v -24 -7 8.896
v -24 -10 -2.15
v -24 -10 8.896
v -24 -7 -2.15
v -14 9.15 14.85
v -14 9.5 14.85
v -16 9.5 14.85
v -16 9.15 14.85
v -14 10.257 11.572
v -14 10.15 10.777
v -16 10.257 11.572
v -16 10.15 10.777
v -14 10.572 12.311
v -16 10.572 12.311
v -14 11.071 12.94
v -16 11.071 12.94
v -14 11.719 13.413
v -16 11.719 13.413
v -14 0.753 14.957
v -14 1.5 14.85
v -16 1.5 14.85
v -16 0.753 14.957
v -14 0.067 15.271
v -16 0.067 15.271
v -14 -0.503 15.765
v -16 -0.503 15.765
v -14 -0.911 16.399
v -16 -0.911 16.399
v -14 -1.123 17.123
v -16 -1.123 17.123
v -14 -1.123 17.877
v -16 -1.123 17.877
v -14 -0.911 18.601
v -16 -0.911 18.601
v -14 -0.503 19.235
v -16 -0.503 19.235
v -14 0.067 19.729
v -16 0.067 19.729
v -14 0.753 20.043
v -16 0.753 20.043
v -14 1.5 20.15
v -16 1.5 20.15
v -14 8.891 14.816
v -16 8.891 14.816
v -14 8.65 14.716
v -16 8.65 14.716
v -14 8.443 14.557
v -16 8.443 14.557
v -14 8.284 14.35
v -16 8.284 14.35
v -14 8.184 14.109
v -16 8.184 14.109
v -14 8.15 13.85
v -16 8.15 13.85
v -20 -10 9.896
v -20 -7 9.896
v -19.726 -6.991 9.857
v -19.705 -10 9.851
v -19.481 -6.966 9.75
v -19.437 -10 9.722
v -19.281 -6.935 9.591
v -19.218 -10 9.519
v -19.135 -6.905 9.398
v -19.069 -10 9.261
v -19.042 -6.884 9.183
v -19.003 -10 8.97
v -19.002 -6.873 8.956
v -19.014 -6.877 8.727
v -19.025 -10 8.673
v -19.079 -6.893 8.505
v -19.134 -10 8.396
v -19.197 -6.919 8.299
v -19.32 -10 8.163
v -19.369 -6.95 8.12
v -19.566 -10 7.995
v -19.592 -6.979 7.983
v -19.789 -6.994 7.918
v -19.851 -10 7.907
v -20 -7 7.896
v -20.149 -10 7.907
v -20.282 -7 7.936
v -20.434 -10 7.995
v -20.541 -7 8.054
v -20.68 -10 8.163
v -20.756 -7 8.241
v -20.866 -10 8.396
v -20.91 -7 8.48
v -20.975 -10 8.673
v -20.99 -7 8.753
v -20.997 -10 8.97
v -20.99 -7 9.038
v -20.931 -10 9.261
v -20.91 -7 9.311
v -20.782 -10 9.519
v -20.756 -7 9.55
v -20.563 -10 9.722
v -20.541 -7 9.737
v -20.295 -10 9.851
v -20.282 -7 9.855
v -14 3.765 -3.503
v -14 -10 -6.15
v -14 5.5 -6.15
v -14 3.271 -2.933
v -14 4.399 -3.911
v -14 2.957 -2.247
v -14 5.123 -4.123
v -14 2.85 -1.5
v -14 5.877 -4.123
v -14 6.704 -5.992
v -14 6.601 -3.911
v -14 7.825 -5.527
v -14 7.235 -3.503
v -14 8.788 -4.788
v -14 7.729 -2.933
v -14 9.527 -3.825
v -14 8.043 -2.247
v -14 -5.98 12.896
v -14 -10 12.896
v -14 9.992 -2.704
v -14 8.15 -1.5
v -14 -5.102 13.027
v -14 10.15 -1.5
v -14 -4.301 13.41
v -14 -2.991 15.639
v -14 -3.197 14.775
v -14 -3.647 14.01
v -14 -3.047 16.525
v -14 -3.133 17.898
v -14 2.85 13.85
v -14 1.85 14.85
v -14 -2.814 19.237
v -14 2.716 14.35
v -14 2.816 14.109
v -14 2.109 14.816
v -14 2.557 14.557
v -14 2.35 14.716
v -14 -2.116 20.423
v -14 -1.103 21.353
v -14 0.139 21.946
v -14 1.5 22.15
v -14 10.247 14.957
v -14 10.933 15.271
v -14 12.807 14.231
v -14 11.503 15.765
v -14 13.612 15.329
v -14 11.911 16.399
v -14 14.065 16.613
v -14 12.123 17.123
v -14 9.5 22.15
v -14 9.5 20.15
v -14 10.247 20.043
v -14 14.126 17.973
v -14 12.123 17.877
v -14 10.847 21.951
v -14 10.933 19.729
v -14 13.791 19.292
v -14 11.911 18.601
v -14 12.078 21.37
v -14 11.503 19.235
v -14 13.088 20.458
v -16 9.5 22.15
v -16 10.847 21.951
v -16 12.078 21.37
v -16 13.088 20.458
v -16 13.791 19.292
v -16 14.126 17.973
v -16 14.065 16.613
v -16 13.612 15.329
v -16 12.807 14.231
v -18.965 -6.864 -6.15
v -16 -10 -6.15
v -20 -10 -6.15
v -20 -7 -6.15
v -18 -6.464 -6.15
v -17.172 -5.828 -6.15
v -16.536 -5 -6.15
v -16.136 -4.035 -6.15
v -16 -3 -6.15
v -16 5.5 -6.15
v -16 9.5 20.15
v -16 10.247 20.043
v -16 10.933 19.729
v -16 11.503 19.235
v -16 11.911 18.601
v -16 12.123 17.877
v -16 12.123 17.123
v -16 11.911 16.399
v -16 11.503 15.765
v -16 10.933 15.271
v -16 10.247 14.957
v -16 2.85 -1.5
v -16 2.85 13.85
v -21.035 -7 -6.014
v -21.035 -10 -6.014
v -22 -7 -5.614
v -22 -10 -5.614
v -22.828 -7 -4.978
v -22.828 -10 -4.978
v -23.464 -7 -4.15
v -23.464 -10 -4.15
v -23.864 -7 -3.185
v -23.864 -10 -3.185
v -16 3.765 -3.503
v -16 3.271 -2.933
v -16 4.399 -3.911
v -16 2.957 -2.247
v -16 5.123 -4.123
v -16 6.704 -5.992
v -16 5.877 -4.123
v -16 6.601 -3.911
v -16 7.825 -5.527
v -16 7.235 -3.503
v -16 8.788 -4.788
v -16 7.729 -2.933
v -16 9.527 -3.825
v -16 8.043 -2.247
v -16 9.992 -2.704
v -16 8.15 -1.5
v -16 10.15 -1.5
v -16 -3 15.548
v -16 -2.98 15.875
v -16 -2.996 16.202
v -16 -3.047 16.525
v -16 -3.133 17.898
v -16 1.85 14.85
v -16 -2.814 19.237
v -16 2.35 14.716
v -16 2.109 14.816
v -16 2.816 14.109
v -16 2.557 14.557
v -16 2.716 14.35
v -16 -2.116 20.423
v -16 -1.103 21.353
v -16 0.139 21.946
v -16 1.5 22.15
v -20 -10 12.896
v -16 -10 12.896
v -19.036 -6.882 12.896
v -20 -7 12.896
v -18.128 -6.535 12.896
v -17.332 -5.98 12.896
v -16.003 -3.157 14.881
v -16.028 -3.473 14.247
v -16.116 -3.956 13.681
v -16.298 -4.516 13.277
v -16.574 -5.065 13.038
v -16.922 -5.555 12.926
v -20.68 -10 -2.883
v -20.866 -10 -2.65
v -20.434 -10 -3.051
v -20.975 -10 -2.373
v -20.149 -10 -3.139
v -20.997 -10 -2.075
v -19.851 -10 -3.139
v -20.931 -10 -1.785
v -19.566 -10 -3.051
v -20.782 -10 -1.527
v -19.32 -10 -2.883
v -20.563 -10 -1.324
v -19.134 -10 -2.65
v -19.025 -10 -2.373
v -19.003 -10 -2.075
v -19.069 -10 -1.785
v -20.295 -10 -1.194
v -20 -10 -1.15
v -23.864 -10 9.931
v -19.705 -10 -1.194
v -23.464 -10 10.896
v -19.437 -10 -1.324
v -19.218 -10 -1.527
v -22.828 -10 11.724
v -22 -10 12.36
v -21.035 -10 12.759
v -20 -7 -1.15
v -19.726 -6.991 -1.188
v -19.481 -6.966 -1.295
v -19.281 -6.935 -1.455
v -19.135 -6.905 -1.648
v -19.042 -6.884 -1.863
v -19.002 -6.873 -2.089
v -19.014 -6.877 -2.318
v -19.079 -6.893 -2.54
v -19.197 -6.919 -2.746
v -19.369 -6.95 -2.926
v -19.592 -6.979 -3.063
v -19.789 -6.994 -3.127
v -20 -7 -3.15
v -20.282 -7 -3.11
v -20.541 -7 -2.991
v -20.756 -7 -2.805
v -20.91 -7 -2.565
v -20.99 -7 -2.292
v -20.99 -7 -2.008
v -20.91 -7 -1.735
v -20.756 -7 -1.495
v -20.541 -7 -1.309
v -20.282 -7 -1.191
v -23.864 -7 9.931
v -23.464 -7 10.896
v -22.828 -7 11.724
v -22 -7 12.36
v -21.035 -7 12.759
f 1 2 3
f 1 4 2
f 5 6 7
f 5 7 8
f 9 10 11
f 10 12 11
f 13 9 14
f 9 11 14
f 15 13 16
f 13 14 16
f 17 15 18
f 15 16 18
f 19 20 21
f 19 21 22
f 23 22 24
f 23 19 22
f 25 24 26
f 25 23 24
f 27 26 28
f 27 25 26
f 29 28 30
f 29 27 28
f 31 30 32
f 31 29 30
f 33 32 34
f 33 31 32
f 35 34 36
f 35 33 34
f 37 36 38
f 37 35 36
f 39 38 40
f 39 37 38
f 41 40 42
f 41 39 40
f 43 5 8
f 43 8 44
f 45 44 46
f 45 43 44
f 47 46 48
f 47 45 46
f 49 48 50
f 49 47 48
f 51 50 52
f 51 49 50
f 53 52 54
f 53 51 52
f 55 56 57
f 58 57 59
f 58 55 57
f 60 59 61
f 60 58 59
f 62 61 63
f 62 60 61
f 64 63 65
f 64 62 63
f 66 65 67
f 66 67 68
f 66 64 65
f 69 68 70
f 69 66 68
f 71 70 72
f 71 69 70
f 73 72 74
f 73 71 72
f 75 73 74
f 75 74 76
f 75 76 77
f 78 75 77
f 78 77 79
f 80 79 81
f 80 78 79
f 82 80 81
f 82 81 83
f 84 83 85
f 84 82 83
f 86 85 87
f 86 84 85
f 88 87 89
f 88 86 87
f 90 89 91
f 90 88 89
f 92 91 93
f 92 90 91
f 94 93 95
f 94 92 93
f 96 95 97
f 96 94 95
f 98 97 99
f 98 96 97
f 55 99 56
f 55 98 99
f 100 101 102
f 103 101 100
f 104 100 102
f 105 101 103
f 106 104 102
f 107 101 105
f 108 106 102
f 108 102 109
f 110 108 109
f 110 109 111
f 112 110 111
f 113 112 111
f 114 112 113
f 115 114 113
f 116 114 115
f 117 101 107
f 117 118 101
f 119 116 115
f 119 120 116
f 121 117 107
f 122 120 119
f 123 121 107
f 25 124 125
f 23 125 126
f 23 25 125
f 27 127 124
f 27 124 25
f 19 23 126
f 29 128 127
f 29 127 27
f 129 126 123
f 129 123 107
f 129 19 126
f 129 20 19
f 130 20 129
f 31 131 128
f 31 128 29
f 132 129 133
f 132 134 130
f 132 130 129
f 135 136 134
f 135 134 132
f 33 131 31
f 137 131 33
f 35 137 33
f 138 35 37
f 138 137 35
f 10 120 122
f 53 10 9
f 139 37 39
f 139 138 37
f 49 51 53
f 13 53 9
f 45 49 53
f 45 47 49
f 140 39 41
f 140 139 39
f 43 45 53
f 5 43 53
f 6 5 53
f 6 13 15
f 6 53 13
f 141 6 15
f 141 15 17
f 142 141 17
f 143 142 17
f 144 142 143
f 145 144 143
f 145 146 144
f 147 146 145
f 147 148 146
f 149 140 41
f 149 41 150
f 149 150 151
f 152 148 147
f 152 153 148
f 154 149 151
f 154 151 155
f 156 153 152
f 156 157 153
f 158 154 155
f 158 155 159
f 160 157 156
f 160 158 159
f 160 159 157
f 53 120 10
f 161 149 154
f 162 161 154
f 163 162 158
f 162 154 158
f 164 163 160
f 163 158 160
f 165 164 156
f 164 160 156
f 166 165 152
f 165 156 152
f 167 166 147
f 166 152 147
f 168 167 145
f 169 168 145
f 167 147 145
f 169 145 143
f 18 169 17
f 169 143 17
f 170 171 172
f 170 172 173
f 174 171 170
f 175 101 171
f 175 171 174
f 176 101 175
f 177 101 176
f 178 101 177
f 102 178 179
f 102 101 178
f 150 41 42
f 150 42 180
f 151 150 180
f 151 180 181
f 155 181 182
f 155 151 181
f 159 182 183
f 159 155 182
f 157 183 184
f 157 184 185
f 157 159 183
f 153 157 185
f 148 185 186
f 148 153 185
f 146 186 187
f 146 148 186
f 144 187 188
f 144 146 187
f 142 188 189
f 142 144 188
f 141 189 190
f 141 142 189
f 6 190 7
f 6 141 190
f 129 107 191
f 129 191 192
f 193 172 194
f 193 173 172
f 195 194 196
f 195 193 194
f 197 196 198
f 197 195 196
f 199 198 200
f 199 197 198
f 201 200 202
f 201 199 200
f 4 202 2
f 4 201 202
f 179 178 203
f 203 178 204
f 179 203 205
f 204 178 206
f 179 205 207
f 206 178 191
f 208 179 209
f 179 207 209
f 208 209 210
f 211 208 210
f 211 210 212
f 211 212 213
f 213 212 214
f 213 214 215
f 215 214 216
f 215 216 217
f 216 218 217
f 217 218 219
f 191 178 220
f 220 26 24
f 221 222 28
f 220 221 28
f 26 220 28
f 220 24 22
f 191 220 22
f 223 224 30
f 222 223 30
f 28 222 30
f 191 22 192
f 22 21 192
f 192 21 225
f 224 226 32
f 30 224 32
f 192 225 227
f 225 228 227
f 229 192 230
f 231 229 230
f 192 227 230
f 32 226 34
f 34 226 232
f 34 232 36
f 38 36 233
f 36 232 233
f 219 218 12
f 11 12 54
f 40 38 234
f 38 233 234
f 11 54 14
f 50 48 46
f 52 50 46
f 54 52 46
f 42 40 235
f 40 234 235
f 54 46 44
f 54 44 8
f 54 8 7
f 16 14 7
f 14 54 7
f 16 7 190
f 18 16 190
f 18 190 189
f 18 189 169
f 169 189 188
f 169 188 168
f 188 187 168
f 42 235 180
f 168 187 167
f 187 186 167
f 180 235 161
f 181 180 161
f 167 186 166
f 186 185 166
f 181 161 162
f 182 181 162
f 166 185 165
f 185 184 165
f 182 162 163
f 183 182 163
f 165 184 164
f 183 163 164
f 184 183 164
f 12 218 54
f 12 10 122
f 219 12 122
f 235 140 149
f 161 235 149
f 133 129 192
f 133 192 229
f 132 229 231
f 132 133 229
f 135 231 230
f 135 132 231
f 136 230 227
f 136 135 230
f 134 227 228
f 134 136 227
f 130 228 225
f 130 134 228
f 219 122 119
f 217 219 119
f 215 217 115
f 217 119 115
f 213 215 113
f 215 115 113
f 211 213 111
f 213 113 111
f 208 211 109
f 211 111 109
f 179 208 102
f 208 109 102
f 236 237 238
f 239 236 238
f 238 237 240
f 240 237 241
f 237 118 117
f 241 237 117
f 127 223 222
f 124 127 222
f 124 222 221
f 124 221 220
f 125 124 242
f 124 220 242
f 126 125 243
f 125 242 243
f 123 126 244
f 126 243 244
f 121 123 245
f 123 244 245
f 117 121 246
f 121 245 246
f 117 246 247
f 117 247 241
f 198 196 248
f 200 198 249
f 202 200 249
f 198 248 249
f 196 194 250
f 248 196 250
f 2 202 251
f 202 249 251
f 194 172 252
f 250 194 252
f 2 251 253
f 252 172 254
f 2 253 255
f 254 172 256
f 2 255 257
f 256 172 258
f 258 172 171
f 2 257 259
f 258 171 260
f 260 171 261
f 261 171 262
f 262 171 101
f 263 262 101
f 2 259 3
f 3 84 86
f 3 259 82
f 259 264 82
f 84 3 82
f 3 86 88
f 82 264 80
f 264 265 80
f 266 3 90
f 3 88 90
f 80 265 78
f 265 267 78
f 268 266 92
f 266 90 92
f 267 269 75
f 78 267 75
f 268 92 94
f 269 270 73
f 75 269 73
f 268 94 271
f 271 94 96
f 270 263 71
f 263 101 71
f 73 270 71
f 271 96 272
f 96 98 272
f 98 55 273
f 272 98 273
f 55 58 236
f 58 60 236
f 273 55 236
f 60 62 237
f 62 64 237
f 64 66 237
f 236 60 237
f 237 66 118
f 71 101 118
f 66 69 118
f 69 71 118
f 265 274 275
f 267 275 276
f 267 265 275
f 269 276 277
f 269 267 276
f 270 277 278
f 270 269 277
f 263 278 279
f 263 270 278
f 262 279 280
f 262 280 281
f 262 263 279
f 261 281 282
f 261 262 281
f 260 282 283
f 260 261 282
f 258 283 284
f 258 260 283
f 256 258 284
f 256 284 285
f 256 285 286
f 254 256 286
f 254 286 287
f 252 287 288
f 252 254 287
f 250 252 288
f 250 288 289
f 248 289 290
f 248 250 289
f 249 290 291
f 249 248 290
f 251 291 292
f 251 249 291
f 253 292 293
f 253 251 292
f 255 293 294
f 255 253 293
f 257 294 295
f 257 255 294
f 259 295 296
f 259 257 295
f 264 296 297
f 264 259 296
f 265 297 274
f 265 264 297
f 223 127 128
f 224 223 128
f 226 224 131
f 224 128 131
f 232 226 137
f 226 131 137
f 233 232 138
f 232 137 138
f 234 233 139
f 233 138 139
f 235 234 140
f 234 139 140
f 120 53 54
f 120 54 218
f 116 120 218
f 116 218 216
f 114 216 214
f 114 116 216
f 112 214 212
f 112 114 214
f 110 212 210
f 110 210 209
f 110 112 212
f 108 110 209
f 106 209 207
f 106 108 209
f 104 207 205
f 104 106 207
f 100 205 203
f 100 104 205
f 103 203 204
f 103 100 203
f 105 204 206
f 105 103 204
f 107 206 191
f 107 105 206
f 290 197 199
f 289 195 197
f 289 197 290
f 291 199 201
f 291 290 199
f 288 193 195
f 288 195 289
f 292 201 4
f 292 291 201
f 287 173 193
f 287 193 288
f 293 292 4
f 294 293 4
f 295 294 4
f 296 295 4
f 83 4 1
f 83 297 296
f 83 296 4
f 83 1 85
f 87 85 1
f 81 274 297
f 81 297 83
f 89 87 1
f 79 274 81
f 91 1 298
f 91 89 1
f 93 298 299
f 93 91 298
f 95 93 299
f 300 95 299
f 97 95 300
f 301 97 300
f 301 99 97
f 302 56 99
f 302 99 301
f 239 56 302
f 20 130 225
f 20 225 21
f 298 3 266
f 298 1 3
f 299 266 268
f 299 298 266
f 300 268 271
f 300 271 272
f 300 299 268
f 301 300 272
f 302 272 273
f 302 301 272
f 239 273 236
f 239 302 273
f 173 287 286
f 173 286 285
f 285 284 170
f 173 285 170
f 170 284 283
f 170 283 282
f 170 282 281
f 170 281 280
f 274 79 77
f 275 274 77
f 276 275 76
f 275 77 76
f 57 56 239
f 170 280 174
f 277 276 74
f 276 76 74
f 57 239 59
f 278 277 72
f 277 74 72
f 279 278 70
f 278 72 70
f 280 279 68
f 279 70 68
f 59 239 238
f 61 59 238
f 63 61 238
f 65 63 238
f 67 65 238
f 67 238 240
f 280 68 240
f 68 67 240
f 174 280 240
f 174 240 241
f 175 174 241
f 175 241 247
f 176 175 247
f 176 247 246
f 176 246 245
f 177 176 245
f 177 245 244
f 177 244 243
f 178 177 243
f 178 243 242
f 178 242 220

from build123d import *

# Parameters (mm, degrees)
BOSS_EXTRUDE1_DEPTH = 2
BOSS_EXTRUDE2_START = -16
BOSS_EXTRUDE2_DEPTH = 2
SKETCH3_W           = 19.045654227
SKETCH3_H           = 3
BOSS_EXTRUDE3_DEPTH = 8
FILLET1_R           = 4
SKETCH5_W           = 1
SKETCH5_H           = 3
HOLE1_AT_2_COUNT    = 2
HOLE1_AT_2_PITCH    = 11.045654227
CUT_EXTRUDE1_START  = 2
SKETCH6_R           = 1
CUT_EXTRUDE1_DEPTH  = 2
FILLET2_R           = 3
FILLET3_R           = 3


# Read off the part's stored shape, not the designer's step: Boss-Extrude2
with BuildPart() as part:
    # Sketch1 → Boss-Extrude1 (new body)
    with BuildSketch(Plane.ZY.offset(14)):
        with BuildLine():
            Line((12.895654227, 10.15), (-1.5, 10.15))
            ThreePointArc((-1.5, 10.15), (-6.15, 5.5), (-1.5, 0.85))
            Line((-1.5, 0.85), (12.895654227, 0.85))
            ThreePointArc((12.895654227, 0.85), (17.825800671, -3.138572401), (22.15, 1.5))
            Line((22.15, 1.5), (22.15, 9.5))
            ThreePointArc((22.15, 9.5), (17.825800671, 14.138572401), (12.895654227, 10.15))
        make_face()
        with BuildLine():
            Line((13.85, 8.15), (-1.5, 8.15))
            ThreePointArc((-1.5, 8.15), (-4.15, 5.5), (-1.5, 2.85))
            Line((-1.5, 2.85), (13.85, 2.85))
            ThreePointArc((13.85, 2.85), (14.557106781, 2.557106781), (14.85, 1.85))
            Line((14.85, 1.85), (14.85, 1.5))
            ThreePointArc((14.85, 1.5), (17.5, -1.15), (20.15, 1.5))
            Line((20.15, 1.5), (20.15, 9.5))
            ThreePointArc((20.15, 9.5), (17.5, 12.15), (14.85, 9.5))
            Line((14.85, 9.5), (14.85, 9.15))
            ThreePointArc((14.85, 9.15), (14.557106781, 8.442893219), (13.85, 8.15))
        make_face(mode=Mode.SUBTRACT)
    extrude(amount=BOSS_EXTRUDE1_DEPTH)

    # Boss-Extrude2 outline → Boss-Extrude2 (add)
    with BuildSketch(Plane.YZ.offset(BOSS_EXTRUDE2_START)):
        with BuildLine():
            Line((-10, 12.895654227), (-10, -6.15))
            Line((-10, -6.15), (5.5, -6.15))
            ThreePointArc((5.5, -6.15), (2.211953467, -4.788046533), (0.85, -1.5))
            Line((0.85, -1.5), (0.85, 12.895654227))
            Line((0.85, 12.895654227), (-10, 12.895654227))
        make_face()
    extrude(amount=BOSS_EXTRUDE2_DEPTH)

    # Sketch3 → Boss-Extrude3 (add)
    with BuildSketch(Plane.ZY.offset(16)):
        with Locations((3.372827114, -8.5)):
            Rectangle(SKETCH3_W, SKETCH3_H)
    extrude(amount=BOSS_EXTRUDE3_DEPTH)

    # Fillet1
    fillet1_edges = [part.edges().sort_by_distance(p)[0] for p in [
        (-24, -8.5, 12.895654227),
        (-24, -8.5, -6.15),
        (-16, -7, 3.372827113),
    ]]
    fillet(fillet1_edges, radius=FILLET1_R - 0.0001)  # a hair under: the kernel refuses the full size

    # Sketch5 → Hole1 (revolve, cut)
    with BuildSketch(Plane(origin=(-20, -7, -2.15), x_dir=(0, 0, 1), z_dir=(1, 0, 0))):
        with Locations((0.5, 1.5)):
            Rectangle(SKETCH5_W, SKETCH5_H)
    hole1 = revolve(axis=Axis((-20, -117, -2.15), (0, 1, 0)), mode=Mode.SUBTRACT)

    # Hole1 at 2: Hole1 ×2
    with Locations(*[(0, 0, i * HOLE1_AT_2_PITCH) for i in range(1, HOLE1_AT_2_COUNT)]):
        add(hole1, mode=Mode.SUBTRACT)

    # Sketch6 → Cut-Extrude1 (cut)
    with BuildSketch(Plane(origin=(0, -7, 0), x_dir=(1, 0, 0), z_dir=(0, 1, 0)).offset(CUT_EXTRUDE1_START)):
        with Locations(Location((-20, -8.895654227, 0), (0, 0, 270))):
            Circle(SKETCH6_R)
        with Locations(Location((-20, 2.15, 0), (0, 0, 270))):
            Circle(SKETCH6_R)
    extrude(amount=-CUT_EXTRUDE1_DEPTH, mode=Mode.SUBTRACT)

    # Fillet2
    fillet2_edges = [part.edges().sort_by_distance(p)[0] for p in [
        (-15, 10.15, 12.895654227),
    ]]
    fillet(fillet2_edges, radius=FILLET2_R)

    # Fillet3
    fillet3_edges = [part.edges().sort_by_distance(p)[0] for p in [
        (-15, 0.85, 12.895654227),
    ]]
    fillet(fillet3_edges, radius=FILLET3_R)


solid = part.part
